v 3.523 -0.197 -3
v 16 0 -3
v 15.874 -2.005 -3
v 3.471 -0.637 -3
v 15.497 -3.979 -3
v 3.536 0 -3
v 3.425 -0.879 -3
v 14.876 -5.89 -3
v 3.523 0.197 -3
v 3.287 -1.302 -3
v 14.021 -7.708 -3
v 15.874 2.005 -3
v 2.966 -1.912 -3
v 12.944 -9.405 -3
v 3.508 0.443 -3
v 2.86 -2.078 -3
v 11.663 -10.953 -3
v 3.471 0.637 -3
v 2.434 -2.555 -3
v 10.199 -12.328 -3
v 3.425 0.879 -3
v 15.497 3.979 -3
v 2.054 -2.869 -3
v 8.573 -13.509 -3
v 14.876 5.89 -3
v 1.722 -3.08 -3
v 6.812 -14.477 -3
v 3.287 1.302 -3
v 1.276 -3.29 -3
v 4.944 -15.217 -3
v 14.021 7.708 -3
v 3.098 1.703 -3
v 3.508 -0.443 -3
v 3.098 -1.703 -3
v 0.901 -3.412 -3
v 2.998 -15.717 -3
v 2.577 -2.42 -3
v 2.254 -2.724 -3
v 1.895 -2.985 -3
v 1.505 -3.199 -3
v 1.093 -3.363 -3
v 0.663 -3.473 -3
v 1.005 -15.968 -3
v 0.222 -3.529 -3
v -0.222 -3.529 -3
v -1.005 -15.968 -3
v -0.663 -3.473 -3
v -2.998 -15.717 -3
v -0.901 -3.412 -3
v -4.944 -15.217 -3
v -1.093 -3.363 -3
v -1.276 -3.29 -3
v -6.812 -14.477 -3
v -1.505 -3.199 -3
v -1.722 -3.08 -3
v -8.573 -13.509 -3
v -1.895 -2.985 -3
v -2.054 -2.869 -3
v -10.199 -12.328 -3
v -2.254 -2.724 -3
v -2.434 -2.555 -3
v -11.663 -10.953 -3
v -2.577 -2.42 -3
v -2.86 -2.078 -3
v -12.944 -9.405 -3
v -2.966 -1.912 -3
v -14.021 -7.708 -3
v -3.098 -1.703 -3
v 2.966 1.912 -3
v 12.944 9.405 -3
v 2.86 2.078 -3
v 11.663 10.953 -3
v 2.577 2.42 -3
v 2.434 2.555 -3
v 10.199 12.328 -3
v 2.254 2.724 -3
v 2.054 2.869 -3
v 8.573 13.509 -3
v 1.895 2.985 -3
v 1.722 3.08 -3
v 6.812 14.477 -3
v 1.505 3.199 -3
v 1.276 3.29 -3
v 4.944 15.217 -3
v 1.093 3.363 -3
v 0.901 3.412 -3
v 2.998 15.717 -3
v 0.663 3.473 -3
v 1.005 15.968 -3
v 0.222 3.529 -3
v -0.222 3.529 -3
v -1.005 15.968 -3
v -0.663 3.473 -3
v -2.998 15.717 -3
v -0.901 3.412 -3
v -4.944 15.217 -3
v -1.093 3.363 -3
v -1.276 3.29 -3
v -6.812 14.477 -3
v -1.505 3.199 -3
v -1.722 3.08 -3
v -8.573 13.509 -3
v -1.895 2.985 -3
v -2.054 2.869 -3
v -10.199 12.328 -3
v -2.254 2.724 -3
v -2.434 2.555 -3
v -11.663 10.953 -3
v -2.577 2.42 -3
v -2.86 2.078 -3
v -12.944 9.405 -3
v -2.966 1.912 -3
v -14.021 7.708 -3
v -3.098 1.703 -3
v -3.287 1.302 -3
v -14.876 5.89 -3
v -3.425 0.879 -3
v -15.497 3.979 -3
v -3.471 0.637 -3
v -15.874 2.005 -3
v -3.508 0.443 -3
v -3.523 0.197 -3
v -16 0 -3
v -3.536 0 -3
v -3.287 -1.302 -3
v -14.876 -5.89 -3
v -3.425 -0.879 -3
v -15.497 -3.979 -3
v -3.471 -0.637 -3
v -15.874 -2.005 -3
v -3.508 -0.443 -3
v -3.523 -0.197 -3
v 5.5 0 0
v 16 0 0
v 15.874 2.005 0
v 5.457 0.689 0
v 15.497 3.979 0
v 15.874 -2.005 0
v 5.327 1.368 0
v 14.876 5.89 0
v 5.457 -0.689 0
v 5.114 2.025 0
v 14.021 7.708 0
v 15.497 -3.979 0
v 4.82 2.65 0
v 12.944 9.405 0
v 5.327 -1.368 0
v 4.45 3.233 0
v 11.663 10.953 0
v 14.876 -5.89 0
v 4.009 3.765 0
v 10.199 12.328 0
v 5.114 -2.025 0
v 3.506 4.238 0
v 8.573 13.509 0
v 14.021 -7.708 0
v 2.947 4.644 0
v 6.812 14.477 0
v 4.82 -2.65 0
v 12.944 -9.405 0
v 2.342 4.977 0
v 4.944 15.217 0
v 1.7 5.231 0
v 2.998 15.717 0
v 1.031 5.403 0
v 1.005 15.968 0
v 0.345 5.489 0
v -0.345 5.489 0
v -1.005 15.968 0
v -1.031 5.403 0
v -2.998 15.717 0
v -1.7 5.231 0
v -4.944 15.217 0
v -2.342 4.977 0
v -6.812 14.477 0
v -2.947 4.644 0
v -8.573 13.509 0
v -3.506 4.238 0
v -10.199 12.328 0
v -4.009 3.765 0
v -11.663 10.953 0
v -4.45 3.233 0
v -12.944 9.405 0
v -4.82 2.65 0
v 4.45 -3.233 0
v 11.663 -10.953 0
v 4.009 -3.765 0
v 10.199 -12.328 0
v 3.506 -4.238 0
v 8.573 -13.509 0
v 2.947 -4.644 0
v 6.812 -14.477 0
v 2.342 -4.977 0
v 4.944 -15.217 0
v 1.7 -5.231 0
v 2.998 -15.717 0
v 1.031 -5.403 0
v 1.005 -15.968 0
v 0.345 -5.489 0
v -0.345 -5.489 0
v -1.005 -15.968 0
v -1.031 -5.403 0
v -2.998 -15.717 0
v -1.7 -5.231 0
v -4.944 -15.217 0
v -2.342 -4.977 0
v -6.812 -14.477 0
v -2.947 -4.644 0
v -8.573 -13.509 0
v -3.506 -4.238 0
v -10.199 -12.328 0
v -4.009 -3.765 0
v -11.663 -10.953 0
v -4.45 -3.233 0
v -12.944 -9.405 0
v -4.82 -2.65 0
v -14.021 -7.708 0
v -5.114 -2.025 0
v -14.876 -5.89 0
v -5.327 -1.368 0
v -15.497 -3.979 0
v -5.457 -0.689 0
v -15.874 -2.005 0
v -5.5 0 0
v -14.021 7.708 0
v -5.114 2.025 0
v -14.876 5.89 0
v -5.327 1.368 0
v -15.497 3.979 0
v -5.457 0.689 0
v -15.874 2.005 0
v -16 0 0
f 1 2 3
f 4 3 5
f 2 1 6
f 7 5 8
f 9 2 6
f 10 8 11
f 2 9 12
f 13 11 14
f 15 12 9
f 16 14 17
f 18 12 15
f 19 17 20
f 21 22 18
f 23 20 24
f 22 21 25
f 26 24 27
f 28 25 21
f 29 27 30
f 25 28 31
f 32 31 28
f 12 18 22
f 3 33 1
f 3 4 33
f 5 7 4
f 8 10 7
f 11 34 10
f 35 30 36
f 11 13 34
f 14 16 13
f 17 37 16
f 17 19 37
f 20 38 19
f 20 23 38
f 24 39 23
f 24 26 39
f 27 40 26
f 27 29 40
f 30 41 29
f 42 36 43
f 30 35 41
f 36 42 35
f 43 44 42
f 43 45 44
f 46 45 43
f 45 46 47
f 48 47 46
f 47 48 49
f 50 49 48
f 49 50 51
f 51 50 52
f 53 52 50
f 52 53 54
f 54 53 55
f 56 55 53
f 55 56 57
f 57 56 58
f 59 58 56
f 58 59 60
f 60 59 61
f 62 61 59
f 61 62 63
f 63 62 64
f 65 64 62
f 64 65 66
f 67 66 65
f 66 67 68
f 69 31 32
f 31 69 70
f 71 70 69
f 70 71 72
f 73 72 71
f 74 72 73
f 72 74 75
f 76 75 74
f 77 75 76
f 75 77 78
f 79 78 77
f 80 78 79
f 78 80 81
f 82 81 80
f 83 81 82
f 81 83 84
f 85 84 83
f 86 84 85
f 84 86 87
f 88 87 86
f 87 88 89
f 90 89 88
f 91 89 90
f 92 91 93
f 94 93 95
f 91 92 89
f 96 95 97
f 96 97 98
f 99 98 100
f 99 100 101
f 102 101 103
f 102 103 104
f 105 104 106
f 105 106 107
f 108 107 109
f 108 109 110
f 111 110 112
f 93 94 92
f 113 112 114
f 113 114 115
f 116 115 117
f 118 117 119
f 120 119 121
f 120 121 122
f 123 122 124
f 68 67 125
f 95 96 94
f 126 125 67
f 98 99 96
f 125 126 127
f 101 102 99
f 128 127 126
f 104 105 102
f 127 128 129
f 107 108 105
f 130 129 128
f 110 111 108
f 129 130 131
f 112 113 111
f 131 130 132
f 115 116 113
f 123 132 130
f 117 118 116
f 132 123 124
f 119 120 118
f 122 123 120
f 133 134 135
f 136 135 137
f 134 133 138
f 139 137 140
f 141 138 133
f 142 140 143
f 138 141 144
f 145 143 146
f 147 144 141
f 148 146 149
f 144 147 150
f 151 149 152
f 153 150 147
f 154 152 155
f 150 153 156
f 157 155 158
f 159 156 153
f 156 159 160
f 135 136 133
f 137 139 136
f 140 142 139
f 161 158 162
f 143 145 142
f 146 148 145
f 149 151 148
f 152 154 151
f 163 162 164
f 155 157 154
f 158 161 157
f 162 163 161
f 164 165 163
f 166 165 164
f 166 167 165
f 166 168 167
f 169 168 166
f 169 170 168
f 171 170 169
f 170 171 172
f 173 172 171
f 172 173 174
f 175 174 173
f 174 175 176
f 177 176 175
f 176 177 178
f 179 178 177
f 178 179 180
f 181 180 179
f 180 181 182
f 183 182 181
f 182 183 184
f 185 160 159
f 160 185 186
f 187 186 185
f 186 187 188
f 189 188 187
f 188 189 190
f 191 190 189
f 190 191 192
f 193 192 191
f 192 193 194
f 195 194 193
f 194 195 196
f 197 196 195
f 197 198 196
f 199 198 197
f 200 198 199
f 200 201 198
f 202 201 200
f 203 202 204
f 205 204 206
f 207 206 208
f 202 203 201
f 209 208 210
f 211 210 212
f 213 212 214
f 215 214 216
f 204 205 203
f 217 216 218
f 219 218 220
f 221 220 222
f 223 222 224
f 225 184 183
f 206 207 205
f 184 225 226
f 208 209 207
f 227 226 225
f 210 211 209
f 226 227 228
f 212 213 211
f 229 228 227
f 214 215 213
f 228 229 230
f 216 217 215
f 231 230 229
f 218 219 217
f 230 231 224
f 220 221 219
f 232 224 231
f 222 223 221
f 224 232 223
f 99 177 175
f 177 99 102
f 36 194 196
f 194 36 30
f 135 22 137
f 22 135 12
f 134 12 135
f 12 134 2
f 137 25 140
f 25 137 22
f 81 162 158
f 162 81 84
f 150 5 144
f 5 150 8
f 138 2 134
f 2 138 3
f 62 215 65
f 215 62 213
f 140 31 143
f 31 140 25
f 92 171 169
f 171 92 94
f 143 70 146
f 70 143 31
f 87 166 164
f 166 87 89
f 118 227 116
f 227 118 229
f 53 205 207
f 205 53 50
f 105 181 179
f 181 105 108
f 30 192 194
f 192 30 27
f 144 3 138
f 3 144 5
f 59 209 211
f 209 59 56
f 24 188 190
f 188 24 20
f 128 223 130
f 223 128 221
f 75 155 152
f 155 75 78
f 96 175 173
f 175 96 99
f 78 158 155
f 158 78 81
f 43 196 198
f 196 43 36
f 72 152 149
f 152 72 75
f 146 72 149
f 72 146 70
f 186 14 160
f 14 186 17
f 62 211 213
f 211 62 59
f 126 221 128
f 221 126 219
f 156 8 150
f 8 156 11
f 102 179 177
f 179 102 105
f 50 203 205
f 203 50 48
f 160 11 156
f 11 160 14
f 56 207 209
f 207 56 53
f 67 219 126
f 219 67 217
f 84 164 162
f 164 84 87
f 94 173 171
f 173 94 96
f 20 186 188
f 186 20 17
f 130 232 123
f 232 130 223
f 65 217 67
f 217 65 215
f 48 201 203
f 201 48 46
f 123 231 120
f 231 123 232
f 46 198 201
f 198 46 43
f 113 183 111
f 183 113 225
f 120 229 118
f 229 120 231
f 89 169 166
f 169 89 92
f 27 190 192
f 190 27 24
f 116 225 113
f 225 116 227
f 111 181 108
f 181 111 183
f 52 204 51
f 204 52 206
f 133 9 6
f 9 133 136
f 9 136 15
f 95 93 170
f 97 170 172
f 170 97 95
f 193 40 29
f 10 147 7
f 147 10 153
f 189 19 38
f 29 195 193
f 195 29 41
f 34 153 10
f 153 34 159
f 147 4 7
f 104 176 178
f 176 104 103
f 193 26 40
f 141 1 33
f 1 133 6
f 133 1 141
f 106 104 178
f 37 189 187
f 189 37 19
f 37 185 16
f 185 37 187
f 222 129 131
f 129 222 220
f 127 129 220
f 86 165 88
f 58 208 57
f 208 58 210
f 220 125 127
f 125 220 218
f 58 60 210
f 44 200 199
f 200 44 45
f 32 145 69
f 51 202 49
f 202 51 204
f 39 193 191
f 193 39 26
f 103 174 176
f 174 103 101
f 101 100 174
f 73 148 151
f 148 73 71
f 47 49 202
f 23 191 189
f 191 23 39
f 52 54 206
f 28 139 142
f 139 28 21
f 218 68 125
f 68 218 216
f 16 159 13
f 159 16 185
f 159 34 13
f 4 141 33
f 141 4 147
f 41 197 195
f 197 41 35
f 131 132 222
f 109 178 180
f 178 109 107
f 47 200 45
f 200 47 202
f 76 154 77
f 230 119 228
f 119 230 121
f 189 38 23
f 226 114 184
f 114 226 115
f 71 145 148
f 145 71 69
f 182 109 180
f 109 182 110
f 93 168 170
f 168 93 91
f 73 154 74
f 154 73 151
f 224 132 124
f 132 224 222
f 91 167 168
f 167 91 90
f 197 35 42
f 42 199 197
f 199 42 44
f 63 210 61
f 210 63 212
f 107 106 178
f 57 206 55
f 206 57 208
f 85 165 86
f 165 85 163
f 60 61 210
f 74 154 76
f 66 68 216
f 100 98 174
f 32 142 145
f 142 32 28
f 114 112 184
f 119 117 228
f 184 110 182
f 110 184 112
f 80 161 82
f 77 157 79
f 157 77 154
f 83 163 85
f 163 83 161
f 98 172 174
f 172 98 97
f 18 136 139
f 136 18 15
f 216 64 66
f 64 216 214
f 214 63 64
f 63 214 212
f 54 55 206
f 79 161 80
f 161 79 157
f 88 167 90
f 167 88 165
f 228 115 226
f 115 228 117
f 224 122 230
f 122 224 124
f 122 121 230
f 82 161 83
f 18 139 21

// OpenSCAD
$fn = 50;


difference() {
	union() {
		translate(v = [0, 0, -3.0000000000]) {
			cylinder(h = 3, r = 10.0000000000);
		}
		translate(v = [0, 0, -3.0000000000]) {
			cylinder(h = 3, r = 16.0000000000);
		}
	}
	union() {
		translate(v = [0, 0, 0]) {
			rotate(a = [0, 0, 0]) {
				difference() {
					union() {
						#translate(v = [0, 0, -3.0000000000]) {
							cylinder(h = 3, r = 2.2500000000);
						}
						#translate(v = [0, 0, -4.2000000000]) {
							cylinder(h = 4.2000000000, r = 10.0000000000, r1 = 2.7500000000, r2 = 5.5000000000);
						}
						#translate(v = [0, 0, -3.0000000000]) {
							cylinder(h = 3, r = 2.7500000000);
						}
						#translate(v = [0, 0, -3.0000000000]) {
							cylinder(h = 3, r = 2.2500000000);
						}
					}
					union();
				}
			}
		}
	}
}
